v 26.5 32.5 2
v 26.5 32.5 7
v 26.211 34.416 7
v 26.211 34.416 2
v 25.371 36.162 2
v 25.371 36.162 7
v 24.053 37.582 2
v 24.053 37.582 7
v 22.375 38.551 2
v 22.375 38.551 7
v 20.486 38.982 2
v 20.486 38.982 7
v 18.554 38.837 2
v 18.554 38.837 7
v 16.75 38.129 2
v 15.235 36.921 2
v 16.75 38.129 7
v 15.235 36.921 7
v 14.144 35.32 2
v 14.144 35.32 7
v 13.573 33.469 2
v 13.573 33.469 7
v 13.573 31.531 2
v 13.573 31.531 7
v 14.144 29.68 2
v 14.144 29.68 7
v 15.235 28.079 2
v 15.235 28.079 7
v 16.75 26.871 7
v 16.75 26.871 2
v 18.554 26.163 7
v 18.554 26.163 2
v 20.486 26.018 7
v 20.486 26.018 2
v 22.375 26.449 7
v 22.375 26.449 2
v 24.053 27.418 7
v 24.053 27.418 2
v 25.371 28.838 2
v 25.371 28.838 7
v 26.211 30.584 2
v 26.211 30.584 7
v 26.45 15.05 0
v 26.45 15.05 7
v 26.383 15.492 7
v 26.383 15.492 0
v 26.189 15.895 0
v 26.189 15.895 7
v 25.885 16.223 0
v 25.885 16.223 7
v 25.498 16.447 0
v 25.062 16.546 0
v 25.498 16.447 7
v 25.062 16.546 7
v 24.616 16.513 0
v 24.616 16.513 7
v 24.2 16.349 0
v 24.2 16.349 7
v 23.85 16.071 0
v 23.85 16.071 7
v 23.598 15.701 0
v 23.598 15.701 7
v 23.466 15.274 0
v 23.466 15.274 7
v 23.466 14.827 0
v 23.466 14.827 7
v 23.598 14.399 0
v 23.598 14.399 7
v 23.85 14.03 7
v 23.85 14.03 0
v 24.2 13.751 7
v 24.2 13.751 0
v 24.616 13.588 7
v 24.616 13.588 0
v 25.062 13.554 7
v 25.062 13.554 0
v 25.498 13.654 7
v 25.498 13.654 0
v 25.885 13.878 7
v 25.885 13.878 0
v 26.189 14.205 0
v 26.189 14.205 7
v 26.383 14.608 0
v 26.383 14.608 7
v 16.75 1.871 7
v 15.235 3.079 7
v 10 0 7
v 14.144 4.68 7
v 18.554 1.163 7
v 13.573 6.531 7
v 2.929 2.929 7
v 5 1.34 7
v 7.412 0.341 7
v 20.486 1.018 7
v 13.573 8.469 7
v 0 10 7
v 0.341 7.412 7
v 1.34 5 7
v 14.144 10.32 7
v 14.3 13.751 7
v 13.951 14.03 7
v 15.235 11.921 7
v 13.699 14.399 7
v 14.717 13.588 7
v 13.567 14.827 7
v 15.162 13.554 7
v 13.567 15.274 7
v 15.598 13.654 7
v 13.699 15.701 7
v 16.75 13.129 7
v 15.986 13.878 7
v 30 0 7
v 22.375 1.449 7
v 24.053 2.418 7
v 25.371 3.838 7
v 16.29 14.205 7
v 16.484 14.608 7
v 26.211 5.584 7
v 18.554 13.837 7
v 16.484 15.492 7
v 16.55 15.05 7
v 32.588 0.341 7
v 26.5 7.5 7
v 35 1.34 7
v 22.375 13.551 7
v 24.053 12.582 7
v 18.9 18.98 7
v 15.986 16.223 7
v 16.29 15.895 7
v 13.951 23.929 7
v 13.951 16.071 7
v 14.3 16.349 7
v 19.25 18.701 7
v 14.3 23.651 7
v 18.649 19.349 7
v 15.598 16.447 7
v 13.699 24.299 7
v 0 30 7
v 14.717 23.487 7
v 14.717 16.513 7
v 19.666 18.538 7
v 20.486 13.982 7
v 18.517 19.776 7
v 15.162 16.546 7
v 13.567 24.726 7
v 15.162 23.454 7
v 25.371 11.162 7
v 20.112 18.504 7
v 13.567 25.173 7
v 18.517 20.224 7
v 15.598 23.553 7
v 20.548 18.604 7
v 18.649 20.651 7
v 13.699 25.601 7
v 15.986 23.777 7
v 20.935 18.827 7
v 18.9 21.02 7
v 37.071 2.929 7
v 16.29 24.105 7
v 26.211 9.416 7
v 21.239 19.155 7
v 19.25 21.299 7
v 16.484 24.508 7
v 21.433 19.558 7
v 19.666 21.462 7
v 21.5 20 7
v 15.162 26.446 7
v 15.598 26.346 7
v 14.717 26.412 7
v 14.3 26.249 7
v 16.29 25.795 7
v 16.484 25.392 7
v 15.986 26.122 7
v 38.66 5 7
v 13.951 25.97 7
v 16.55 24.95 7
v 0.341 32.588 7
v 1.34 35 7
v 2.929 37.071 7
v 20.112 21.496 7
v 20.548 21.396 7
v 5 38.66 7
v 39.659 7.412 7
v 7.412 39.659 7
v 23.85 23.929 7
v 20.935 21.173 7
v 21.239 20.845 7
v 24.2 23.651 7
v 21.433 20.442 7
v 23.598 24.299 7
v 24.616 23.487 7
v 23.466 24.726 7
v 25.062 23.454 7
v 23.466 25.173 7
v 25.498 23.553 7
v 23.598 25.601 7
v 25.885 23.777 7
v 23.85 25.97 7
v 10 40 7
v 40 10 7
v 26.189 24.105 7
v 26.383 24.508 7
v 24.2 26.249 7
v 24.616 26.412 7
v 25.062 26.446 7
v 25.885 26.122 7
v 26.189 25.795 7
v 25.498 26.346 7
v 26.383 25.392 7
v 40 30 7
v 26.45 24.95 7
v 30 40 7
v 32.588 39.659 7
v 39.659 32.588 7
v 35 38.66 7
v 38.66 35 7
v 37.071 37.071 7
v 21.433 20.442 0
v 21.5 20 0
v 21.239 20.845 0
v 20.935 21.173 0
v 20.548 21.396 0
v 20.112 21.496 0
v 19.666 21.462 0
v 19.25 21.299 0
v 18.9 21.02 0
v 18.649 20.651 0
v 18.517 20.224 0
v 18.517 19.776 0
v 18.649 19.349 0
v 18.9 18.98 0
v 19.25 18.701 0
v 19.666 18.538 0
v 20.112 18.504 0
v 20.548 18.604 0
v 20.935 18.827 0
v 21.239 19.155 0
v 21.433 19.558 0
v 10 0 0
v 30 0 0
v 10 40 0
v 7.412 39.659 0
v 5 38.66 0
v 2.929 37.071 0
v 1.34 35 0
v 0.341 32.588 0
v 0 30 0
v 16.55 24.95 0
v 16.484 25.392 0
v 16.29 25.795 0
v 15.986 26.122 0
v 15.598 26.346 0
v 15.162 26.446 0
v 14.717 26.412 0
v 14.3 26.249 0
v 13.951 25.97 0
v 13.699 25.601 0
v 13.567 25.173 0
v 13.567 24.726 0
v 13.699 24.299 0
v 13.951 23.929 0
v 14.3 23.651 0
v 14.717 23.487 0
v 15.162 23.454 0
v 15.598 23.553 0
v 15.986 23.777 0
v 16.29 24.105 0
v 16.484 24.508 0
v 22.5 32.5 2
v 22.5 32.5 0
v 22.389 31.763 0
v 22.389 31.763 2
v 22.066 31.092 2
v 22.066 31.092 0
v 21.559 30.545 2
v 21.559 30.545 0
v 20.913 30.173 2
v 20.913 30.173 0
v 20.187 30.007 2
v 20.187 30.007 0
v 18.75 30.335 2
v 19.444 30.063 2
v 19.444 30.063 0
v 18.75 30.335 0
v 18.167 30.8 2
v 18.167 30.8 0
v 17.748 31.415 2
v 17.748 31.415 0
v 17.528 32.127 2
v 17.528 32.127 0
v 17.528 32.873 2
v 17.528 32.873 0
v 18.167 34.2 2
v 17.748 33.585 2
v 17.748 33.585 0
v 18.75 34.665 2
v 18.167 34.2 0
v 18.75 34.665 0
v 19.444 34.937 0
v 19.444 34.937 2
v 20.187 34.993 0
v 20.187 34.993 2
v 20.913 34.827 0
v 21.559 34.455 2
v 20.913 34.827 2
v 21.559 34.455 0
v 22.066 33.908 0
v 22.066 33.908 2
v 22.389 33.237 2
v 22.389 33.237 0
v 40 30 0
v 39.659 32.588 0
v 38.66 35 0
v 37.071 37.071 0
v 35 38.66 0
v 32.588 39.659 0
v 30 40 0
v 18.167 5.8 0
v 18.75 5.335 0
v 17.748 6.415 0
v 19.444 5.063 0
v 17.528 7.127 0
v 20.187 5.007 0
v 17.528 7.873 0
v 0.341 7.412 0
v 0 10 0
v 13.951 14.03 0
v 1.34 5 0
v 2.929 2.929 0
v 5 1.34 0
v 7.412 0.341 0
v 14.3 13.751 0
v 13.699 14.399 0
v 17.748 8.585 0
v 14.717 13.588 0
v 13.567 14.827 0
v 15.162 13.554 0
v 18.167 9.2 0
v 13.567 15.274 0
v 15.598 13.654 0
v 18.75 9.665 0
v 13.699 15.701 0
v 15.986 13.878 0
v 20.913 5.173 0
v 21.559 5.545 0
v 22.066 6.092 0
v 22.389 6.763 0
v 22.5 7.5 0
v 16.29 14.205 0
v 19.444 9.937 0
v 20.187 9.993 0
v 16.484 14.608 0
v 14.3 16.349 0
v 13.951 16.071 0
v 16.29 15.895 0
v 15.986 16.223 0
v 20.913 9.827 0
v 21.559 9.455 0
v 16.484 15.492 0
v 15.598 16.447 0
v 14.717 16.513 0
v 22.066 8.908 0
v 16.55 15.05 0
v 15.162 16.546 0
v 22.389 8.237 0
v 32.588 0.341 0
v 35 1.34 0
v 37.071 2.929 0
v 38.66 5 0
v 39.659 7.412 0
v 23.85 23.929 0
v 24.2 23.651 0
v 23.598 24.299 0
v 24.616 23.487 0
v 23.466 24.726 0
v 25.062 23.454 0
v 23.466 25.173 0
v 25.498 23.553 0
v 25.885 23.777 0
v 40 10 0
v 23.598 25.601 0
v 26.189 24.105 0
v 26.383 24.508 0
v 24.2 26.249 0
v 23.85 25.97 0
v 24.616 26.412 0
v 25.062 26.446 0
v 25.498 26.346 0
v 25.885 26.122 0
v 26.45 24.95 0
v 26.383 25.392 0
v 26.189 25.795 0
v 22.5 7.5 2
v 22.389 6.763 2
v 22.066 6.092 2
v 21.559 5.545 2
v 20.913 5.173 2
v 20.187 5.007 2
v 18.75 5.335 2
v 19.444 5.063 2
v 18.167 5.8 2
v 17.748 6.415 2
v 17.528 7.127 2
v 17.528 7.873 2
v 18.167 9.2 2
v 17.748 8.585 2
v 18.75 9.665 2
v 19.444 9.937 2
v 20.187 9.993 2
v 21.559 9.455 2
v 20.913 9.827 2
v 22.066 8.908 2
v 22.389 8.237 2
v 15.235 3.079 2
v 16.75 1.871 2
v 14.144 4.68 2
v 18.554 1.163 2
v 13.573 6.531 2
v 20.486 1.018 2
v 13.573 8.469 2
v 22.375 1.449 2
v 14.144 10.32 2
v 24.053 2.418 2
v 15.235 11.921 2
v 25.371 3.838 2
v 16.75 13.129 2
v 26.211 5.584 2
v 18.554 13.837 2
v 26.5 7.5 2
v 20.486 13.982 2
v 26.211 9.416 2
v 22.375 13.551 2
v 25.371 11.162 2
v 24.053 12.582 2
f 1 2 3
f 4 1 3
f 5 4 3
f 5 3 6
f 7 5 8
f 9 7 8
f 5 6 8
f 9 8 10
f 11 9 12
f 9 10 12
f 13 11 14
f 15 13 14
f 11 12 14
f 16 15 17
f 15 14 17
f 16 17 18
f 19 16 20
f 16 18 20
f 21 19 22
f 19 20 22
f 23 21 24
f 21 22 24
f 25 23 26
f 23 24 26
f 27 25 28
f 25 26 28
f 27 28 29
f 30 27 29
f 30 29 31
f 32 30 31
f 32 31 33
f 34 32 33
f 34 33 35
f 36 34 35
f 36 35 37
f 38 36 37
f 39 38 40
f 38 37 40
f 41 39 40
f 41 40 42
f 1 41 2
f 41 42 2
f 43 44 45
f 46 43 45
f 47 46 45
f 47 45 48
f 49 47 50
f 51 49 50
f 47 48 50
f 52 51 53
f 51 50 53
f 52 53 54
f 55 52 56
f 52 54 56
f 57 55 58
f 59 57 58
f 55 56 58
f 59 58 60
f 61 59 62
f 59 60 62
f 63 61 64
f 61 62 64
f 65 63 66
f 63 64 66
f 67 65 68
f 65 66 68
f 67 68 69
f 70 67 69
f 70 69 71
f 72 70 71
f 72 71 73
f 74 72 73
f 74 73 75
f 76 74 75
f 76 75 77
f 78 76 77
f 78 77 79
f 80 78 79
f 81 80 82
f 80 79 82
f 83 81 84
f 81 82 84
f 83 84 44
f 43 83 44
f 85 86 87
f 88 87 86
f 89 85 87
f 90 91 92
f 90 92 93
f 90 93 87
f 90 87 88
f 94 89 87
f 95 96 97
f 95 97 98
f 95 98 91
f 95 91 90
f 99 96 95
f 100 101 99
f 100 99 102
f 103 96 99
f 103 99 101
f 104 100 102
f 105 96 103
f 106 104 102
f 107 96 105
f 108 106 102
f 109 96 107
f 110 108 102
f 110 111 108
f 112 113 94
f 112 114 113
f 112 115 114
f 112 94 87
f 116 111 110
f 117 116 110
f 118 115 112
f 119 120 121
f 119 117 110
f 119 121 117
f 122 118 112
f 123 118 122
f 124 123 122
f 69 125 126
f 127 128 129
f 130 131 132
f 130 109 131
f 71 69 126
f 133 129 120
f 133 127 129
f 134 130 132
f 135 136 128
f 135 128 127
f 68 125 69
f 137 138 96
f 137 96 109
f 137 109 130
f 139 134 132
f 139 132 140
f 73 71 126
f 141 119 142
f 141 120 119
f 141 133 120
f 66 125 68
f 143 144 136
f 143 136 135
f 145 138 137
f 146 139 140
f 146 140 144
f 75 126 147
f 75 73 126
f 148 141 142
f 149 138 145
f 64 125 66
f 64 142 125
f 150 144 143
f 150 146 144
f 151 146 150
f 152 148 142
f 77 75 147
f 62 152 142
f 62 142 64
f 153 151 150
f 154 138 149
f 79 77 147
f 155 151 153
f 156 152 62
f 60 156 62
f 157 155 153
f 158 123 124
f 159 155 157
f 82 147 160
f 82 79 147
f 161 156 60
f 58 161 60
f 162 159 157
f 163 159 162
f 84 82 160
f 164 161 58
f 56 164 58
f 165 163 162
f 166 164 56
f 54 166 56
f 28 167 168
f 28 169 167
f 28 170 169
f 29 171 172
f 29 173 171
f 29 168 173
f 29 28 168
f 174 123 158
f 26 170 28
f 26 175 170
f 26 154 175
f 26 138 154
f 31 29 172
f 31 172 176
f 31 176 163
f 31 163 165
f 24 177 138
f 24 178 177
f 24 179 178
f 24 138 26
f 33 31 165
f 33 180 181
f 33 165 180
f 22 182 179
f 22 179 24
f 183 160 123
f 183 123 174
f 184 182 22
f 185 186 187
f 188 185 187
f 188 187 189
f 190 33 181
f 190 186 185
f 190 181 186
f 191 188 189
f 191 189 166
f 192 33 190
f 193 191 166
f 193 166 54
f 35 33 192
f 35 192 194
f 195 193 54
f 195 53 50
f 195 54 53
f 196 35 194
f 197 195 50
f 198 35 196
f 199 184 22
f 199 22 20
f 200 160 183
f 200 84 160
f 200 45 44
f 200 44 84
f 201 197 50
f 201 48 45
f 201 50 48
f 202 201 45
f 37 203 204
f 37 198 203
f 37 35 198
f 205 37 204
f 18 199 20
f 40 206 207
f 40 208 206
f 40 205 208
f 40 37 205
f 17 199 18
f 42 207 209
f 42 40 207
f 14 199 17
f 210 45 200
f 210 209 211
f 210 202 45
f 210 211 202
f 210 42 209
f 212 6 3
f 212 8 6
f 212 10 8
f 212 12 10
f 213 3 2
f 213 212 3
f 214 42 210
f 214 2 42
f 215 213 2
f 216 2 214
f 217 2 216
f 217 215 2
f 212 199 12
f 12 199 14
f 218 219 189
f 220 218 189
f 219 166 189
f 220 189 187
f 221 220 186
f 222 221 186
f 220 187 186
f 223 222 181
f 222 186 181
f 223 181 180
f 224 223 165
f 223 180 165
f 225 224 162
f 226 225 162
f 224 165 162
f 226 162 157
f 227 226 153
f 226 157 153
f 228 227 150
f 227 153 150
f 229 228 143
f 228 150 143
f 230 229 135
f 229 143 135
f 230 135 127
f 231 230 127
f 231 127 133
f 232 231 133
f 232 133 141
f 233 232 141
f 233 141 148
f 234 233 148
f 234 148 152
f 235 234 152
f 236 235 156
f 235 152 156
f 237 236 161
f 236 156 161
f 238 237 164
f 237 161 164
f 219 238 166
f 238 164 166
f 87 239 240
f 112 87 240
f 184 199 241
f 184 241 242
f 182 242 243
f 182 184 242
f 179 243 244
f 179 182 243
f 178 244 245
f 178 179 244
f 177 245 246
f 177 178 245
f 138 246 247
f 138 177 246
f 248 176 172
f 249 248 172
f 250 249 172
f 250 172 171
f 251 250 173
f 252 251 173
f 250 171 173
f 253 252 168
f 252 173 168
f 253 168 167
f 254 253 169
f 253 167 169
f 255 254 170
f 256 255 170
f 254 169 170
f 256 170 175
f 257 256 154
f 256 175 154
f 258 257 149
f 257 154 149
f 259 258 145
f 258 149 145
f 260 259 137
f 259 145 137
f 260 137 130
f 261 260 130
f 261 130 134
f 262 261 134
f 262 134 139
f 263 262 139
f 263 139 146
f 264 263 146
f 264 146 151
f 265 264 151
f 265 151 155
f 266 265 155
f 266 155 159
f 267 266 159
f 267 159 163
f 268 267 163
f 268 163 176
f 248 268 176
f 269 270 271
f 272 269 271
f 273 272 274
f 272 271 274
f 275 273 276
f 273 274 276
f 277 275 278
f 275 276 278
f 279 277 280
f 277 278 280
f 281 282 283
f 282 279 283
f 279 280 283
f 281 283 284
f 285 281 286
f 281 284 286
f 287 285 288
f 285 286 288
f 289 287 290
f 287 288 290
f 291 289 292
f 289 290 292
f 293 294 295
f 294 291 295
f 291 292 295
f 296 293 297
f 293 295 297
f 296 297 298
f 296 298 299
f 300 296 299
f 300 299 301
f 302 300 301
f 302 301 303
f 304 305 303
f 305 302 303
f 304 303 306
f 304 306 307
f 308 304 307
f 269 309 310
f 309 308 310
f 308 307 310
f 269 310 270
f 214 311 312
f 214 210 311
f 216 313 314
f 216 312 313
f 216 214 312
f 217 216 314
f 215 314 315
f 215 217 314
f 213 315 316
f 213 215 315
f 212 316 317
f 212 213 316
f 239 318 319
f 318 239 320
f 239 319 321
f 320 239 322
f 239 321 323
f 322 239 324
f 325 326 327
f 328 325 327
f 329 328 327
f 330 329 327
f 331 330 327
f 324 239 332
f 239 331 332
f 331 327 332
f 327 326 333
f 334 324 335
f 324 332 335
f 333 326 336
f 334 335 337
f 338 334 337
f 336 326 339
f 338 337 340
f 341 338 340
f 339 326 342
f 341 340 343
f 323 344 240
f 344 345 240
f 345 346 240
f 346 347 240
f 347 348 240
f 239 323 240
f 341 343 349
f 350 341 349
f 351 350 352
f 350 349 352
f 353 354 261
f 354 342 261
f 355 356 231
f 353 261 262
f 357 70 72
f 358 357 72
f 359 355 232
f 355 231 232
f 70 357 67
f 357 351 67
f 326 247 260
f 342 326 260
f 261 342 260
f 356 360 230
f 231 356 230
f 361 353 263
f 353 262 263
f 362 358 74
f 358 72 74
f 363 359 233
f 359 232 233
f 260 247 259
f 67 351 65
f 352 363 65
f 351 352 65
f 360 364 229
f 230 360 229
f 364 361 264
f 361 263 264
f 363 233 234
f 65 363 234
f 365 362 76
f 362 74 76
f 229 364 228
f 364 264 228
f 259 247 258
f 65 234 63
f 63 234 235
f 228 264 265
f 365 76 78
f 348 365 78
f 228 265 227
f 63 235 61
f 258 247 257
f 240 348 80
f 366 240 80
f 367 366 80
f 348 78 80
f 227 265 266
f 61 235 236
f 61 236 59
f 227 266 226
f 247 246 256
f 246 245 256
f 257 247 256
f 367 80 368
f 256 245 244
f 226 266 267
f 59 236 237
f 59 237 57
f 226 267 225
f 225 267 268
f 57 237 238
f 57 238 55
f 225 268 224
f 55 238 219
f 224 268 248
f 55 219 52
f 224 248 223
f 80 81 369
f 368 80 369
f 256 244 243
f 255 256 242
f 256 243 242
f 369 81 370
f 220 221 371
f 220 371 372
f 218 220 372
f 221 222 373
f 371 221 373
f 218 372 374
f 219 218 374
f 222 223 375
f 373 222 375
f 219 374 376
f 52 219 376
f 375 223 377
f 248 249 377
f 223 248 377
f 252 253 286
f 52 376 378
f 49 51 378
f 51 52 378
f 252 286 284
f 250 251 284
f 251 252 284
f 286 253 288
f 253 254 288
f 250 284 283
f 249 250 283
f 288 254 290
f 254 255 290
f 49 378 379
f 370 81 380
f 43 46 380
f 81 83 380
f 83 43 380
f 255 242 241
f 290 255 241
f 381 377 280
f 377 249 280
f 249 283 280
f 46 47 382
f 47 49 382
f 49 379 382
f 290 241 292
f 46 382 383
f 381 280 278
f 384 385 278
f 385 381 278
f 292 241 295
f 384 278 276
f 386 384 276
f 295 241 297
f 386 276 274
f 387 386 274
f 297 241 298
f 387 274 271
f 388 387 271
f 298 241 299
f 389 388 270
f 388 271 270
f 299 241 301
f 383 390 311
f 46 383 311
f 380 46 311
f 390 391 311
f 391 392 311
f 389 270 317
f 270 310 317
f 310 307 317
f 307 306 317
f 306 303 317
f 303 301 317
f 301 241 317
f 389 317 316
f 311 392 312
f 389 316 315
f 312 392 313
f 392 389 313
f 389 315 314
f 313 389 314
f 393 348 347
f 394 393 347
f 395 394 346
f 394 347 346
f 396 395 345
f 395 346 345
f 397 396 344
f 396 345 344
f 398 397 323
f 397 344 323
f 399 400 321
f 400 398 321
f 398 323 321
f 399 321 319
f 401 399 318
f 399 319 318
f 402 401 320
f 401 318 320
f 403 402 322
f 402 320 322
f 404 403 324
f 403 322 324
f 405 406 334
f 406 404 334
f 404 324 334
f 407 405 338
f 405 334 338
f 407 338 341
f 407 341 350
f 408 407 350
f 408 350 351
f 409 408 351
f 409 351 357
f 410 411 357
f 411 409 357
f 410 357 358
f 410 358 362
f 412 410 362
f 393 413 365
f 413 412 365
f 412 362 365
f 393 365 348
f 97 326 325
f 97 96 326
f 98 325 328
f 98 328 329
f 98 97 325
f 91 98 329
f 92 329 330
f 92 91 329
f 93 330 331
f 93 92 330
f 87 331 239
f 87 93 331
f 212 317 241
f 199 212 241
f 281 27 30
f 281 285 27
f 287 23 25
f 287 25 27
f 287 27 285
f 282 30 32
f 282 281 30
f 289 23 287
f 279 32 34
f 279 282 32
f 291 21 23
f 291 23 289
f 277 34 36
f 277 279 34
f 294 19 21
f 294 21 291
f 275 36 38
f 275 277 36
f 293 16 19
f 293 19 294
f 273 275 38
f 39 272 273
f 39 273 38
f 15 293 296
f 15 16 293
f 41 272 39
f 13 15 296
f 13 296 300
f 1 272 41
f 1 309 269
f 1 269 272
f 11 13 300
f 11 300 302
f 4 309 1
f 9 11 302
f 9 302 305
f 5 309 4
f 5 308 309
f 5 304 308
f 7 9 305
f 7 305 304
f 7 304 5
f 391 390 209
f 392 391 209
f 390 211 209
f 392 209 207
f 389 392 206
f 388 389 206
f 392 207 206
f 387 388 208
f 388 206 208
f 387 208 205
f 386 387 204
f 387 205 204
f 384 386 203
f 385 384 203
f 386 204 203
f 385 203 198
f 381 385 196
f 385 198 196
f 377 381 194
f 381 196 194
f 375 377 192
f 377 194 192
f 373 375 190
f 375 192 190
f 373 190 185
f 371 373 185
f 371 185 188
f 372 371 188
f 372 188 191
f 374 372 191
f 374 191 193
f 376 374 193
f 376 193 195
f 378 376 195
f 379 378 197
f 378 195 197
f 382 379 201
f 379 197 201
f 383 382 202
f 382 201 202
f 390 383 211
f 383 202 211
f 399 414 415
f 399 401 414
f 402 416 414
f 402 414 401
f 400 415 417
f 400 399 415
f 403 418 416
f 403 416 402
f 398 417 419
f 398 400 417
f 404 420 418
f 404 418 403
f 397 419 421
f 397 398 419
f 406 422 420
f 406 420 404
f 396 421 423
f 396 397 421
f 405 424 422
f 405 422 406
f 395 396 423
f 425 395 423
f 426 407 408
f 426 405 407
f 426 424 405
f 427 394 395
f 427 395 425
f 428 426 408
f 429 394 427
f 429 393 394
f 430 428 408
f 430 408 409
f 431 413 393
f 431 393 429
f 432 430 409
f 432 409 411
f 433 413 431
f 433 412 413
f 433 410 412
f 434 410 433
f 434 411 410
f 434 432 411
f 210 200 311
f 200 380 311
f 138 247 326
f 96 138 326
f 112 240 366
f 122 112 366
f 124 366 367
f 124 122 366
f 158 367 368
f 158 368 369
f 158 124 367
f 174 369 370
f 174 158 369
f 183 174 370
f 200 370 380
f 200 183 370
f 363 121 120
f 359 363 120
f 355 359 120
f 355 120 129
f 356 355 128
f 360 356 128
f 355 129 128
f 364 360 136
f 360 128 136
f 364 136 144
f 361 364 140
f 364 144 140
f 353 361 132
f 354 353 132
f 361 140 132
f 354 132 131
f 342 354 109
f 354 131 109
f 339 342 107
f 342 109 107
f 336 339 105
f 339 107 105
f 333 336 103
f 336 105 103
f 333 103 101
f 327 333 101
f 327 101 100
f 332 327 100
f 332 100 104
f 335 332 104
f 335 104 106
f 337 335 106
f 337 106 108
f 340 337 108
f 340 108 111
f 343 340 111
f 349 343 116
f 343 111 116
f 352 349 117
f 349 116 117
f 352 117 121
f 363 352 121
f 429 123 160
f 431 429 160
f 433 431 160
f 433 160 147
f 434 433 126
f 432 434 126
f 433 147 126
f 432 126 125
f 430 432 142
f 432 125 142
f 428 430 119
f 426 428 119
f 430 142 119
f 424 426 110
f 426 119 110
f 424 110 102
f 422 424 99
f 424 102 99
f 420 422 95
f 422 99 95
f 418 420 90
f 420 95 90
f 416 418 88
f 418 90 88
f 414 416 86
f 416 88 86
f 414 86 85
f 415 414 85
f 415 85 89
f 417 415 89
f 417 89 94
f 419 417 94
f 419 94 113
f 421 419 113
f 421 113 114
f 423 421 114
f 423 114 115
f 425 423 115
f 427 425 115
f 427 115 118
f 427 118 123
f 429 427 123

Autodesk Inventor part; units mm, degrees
ref_plane "YZ Plane" through (0, 0, 0) normal (1, 0, 0) x (0, 1, 0)
ref_plane "XZ Plane" through (0, 0, 0) normal (0, 1, 0) x (-1, 0, 0)
ref_plane "XY Plane" through (0, 0, 0) normal (0, 0, 1) x (1, 0, 0)
sketch "Sketch1" plane through (0, 0, 0) normal (0, 0, 1) x (1, 0, 0)
  line L0 (0, 0) -> (40, 0)
  line L1 (40, 0) -> (40, 40)
  line L2 (40, 40) -> (0, 40)
  line L3 (0, 40) -> (0, 0)
  line L4 (20, 32.5) -> (20, 7.5) construction
  circle A0 centre (20, 32.5) radius 2.5
  circle A1 centre (20, 7.5) radius 2.5
  point P0 (20, 20)
  point P1 (40, 20)
  point P2 (20, 40)
  dimension "d0" = 40
  dimension "d1" = 40
  dimension "d2" = 25
  dimension "d3" = 5
  dimension "d4" = 5
extrude "Extrusion1" add sketch "Sketch1" along normal blind 7
sketch "Sketch2" plane through (0, 0, 7) normal (0, 0, 1) x (1, 0, 0)
  circle A0 centre (20, 32.5) radius 2.5 projected
  circle A1 centre (20, 7.5) radius 2.5 projected
  circle A2 centre (20, 32.5) radius 6.5
  circle A3 centre (20, 7.5) radius 6.5
  point P0 (0, 0)
  dimension "d7" = 13
  dimension "d8" = 13
extrude "Extrusion2" cut sketch "Sketch2" against normal blind 5
sketch "Sketch3" plane through (0, 0, 7) normal (0, 0, 1) x (1, 0, 0)
  circle A0 centre (20, 20) radius 1.5
  line L0 (40, 40) -> (0, 40) projected
  line L1 (40, 0) -> (40, 40) projected
  circle A1 centre (24.9497, 24.9497) radius 1.5
  line L2 (20, 20) -> (24.9497, 24.9497) construction
  line L3 (20, 20) -> (27, 20) construction
  circle A2 centre (15.0503, 24.9497) radius 1.5
  circle A3 centre (15.0503, 15.0503) radius 1.5
  circle A4 centre (24.9497, 15.0503) radius 1.5
  point P0 (0, 0)
  point P1 (20, 40)
  point P2 (40, 20)
  dimension "d11" = 3
  dimension "d12" = 3
  dimension "d13" = 45
  dimension "d14" = 7
  dimension "d17" = 360
extrude "Extrusion3" cut sketch "Sketch3" against normal through all
fillet "Fillet1" radius 10 4 edges at (40, 40, 3.5) (40, 0, 3.5) (0, 40, 3.5) (0, 0, 3.5)
properties part number "AA047" material "ABS Plastic"
